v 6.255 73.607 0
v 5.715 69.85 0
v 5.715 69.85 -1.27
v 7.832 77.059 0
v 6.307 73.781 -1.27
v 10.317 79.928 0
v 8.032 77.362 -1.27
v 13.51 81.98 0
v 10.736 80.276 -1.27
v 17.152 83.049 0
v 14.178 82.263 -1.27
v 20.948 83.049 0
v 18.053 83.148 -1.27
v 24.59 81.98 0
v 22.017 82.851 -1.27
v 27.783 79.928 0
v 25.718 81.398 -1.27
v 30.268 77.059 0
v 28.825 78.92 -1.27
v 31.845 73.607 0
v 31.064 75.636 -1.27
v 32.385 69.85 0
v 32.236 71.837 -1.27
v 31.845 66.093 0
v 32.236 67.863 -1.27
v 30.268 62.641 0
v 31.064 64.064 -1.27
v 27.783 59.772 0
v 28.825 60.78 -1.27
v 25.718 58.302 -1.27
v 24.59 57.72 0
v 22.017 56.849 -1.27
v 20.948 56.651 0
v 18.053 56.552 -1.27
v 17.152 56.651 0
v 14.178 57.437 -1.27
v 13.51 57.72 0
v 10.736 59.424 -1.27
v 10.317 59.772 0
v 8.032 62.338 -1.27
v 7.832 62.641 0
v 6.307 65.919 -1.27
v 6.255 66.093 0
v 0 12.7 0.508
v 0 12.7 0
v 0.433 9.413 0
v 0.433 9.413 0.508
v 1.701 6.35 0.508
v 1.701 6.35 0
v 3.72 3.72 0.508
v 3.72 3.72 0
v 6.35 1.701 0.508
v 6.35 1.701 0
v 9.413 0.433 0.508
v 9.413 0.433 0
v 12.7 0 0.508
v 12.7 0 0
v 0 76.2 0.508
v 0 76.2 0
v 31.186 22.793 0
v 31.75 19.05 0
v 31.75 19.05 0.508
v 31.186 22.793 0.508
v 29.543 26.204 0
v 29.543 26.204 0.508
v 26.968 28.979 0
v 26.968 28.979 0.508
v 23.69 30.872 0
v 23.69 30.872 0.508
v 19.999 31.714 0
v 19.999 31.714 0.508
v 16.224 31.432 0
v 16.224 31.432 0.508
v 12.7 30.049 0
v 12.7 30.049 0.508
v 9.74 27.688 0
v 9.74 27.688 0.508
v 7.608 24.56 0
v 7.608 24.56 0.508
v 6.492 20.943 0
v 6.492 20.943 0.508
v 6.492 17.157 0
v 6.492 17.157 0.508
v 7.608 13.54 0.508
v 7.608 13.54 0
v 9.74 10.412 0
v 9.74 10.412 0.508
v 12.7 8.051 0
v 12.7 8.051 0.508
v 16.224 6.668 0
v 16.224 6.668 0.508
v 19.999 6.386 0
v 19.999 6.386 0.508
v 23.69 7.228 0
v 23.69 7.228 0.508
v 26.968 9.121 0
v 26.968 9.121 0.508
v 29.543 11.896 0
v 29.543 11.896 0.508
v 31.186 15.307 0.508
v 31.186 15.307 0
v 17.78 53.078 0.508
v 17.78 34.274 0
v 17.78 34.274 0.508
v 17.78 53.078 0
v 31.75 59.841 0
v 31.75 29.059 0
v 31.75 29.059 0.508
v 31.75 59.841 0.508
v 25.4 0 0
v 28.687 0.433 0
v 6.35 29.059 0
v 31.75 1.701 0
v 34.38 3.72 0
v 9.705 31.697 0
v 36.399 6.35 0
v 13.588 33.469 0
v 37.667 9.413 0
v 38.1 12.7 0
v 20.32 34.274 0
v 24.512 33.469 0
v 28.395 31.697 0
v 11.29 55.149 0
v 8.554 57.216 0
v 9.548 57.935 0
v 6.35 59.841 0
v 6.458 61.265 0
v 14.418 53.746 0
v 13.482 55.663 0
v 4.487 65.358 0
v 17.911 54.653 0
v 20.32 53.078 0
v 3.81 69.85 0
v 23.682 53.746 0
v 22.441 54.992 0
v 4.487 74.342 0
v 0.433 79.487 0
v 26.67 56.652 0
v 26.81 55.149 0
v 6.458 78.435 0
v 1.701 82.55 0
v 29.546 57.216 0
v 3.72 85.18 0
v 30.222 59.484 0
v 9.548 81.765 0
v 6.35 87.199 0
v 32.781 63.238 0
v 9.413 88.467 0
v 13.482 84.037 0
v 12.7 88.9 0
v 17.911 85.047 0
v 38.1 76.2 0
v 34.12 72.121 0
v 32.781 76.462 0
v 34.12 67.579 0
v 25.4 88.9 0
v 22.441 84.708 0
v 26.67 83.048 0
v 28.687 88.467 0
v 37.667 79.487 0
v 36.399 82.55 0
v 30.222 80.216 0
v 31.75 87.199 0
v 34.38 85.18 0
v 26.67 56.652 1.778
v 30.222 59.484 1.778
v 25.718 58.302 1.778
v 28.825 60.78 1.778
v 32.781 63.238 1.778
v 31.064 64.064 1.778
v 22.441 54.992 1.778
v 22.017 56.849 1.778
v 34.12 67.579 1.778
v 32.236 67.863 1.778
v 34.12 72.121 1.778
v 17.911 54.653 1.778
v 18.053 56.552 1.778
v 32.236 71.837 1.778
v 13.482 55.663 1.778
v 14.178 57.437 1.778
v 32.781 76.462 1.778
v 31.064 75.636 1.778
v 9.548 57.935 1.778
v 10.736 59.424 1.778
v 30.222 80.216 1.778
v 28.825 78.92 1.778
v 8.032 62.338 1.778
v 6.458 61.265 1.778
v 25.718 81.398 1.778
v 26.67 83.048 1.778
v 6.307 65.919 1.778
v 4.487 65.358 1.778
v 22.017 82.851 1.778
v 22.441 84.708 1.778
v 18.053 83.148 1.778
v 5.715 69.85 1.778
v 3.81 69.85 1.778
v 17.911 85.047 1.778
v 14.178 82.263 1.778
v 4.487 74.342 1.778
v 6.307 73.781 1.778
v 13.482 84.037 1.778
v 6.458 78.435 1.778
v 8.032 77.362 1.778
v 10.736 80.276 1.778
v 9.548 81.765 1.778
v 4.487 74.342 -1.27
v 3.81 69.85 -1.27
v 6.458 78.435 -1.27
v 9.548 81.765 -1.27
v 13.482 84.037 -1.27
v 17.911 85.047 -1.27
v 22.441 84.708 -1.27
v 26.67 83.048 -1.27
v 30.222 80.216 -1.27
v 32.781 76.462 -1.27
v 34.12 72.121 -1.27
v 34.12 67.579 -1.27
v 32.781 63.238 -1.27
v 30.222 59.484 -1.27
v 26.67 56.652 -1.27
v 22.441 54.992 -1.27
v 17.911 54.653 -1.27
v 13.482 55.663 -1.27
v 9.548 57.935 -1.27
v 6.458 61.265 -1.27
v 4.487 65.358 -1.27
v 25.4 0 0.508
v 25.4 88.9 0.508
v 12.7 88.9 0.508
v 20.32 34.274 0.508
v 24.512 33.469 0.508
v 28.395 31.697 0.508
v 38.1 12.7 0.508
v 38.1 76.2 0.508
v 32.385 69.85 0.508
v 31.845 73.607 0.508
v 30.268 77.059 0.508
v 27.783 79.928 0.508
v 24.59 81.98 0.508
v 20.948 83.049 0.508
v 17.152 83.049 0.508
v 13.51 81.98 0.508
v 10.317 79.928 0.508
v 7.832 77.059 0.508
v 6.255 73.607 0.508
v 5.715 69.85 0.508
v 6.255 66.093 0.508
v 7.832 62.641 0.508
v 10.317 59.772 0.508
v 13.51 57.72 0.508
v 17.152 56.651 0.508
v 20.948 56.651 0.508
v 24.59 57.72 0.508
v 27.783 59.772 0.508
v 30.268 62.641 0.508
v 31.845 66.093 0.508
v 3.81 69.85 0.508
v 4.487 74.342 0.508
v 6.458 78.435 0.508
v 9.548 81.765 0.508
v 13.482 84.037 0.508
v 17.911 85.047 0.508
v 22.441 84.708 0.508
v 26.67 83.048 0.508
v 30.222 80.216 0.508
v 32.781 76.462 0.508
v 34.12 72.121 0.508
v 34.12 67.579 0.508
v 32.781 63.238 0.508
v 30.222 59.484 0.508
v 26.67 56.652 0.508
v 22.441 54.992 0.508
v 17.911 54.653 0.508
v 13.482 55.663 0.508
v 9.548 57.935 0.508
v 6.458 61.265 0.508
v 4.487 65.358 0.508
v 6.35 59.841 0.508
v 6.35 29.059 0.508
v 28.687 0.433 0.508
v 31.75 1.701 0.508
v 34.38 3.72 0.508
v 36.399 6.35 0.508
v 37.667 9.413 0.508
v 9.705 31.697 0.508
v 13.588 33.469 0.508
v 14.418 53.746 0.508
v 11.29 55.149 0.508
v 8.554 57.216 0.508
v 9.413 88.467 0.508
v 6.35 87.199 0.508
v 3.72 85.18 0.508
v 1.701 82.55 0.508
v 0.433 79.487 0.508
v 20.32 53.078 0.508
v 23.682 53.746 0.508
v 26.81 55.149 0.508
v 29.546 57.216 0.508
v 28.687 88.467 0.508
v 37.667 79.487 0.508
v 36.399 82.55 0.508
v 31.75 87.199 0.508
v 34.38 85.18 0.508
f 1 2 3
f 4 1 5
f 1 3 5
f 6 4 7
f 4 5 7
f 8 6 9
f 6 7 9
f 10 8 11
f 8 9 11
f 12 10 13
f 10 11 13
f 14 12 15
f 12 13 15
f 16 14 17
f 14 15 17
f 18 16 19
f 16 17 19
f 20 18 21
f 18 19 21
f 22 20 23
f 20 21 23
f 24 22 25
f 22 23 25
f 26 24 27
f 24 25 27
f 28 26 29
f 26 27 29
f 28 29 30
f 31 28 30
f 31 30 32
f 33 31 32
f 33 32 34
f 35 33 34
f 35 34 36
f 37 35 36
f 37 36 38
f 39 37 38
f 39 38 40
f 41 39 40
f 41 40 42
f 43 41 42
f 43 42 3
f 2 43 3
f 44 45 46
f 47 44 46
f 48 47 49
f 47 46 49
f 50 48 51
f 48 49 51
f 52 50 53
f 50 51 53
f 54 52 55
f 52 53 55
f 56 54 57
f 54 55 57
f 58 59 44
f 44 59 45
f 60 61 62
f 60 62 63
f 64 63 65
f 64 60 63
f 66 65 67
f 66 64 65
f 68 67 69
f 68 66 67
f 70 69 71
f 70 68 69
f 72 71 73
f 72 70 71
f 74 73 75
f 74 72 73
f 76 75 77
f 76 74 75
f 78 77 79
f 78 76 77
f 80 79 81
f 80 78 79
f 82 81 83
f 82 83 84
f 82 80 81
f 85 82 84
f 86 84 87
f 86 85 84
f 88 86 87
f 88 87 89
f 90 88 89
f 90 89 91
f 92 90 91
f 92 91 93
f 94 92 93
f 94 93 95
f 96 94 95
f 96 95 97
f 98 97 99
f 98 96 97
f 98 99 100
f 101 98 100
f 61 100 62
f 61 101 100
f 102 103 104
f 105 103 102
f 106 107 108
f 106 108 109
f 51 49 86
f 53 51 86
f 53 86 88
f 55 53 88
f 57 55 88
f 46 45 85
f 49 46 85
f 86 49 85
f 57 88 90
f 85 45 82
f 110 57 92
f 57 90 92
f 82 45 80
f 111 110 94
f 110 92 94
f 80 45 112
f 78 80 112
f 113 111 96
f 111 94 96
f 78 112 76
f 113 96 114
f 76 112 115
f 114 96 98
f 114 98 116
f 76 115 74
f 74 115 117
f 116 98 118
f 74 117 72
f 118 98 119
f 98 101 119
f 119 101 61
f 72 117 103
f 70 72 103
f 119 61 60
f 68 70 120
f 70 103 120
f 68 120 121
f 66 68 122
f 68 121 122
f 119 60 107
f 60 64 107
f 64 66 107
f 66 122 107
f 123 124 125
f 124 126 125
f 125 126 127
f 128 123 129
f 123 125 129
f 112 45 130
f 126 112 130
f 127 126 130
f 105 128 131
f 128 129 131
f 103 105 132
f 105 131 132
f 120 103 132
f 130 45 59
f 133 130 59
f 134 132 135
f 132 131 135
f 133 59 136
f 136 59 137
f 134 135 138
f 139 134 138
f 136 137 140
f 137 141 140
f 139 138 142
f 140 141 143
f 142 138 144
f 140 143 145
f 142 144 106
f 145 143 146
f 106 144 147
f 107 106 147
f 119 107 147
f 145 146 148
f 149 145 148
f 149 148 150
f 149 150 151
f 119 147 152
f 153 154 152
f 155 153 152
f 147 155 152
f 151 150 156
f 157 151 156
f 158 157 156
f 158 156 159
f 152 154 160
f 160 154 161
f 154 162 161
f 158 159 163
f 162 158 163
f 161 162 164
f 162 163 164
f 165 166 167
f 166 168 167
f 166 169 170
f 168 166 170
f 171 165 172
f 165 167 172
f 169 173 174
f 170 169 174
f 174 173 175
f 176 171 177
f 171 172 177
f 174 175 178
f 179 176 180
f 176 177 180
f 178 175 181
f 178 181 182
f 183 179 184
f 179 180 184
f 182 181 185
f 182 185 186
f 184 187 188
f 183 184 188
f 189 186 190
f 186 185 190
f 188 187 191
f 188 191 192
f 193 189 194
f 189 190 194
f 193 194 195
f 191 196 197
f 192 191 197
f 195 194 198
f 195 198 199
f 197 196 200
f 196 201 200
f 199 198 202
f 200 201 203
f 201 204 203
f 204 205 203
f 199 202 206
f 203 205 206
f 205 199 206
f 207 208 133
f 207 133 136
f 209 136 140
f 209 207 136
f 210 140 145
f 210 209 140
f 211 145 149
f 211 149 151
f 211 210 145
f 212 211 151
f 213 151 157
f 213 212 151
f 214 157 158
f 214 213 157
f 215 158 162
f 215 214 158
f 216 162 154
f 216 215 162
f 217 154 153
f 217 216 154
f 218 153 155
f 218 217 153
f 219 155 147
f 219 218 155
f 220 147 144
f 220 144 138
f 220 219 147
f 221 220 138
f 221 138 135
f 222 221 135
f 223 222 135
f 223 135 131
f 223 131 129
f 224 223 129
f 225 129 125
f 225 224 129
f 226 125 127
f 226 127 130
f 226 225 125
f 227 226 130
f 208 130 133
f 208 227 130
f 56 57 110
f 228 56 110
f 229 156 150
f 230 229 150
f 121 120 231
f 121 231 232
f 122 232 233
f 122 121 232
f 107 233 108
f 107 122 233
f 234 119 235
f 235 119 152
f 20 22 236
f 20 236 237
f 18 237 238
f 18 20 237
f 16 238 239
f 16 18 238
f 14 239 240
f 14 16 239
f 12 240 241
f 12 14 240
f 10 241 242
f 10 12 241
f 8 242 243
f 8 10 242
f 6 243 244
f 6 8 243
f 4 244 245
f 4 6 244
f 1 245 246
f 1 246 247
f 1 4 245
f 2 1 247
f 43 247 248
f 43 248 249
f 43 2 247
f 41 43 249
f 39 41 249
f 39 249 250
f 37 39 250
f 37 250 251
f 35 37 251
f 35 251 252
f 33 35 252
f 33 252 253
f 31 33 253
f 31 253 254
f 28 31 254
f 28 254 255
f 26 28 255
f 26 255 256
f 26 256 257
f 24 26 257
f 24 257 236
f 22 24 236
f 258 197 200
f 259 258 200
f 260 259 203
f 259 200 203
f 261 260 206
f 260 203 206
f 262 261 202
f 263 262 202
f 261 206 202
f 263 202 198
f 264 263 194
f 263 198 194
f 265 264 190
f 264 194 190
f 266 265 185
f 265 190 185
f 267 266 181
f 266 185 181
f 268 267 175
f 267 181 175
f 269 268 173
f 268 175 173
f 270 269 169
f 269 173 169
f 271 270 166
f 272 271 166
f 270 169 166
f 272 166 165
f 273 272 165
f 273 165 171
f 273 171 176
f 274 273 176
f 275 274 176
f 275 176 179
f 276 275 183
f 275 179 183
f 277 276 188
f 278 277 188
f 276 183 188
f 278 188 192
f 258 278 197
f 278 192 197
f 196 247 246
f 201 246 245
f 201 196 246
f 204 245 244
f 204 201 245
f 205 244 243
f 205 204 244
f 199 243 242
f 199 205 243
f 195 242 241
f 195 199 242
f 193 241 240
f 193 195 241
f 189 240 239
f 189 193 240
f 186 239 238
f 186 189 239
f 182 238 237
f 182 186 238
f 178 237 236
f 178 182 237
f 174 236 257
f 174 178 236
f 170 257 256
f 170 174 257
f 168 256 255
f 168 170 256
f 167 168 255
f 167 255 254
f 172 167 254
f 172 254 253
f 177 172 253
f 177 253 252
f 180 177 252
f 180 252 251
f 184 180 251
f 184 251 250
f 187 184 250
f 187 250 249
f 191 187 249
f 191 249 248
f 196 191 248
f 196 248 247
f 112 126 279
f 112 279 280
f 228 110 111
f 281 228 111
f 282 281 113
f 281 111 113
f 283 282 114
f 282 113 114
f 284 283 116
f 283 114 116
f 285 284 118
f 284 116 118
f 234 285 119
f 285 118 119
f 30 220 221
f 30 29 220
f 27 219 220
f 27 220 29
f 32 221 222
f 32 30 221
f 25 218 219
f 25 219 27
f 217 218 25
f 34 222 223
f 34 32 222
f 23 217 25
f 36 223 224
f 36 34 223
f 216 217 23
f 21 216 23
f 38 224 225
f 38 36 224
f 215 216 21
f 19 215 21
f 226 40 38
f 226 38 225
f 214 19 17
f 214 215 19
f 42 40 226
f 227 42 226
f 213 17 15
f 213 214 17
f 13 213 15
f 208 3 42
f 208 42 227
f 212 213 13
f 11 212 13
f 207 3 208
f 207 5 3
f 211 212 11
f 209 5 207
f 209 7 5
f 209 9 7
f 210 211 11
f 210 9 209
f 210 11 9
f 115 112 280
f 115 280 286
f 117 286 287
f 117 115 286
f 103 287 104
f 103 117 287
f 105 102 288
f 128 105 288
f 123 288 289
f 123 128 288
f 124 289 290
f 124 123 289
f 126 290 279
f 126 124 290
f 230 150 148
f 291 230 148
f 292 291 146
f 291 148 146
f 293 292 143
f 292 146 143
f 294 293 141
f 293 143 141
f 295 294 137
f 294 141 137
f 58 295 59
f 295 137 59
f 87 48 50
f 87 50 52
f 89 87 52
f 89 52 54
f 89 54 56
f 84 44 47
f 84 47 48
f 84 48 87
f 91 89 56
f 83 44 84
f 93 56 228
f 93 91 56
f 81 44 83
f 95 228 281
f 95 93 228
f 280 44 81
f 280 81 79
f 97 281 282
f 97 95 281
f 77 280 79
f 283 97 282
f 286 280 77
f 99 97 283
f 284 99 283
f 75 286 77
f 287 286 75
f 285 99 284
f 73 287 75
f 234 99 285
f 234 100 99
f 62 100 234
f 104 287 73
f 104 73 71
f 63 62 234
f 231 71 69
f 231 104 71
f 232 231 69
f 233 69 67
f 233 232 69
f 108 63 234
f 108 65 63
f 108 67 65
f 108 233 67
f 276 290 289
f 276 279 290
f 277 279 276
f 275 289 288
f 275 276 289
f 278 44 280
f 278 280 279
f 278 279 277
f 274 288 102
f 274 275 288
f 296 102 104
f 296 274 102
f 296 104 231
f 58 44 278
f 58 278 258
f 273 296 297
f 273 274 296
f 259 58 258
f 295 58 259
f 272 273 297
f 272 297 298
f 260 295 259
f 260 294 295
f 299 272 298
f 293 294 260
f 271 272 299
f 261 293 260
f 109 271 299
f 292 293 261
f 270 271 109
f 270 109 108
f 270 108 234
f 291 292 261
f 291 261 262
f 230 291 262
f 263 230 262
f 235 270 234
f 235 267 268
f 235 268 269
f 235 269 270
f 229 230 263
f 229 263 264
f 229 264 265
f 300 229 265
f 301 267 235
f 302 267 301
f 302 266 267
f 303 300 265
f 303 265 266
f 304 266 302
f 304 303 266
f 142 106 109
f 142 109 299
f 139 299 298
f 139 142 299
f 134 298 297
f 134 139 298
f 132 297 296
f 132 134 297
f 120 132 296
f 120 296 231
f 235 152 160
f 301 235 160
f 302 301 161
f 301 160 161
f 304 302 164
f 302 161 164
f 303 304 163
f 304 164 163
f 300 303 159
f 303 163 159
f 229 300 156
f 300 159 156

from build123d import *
from build123d.topology import SkipClean

# Parameters (mm, degrees)
SKETCH2_R           = 13.335
SKETCH2_R_2         = 12.7
BOSS_EXTRUDE1_DEPTH = 0.508
BOSS_EXTRUDE2_START = 1.27
SKETCH3_R           = 15.24
SKETCH3_R_2         = 13.335
BOSS_EXTRUDE2_DEPTH = 1.27
CUT_EXTRUDE1_DEPTH  = 97.736659463
BOSS_EXTRUDE3_DEPTH = 0.508


with BuildPart() as part:
    # Sketch2 → Boss-Extrude1 (new body)
    with BuildSketch(Plane.XY):
        with BuildLine():
            Line((12.7, 0), (25.4, 0))
            ThreePointArc((25.4, 0), (34.380256121, 3.719743879), (38.1, 12.7))
            Line((38.1, 12.7), (38.1, 76.2))
            ThreePointArc((38.1, 76.2), (34.380256121, 85.180256121), (25.4, 88.9))
            Line((25.4, 88.9), (12.7, 88.9))
            ThreePointArc((12.7, 88.9), (3.719743879, 85.180256121), (0, 76.2))
            Line((0, 76.2), (0, 12.7))
            ThreePointArc((0, 12.7), (3.719743879, 3.719743879), (12.7, 0))
        make_face()
        with Locations((19.05, 69.85)):
            Circle(SKETCH2_R, mode=Mode.SUBTRACT)
        with Locations((19.05, 19.05)):
            Circle(SKETCH2_R_2, mode=Mode.SUBTRACT)
    extrude(amount=BOSS_EXTRUDE1_DEPTH)

    # Sketch3 → Boss-Extrude2 (add)
    with SkipClean():  # the faces are left unmerged after this step: merging them gives an invalid solid
        with BuildSketch(Plane(origin=(0, 0, 0), x_dir=(-1, 0, 0), z_dir=(0, 0, -1)).offset(BOSS_EXTRUDE2_START)):
            with Locations((-19.05, 69.85)):
                Circle(SKETCH3_R)
            with Locations((-19.05, 69.85)):
                Circle(SKETCH3_R_2, mode=Mode.SUBTRACT)
        boss_extrude2 = extrude(amount=-BOSS_EXTRUDE2_DEPTH)

    # Mirror1: Boss-Extrude2 across plane
    add(boss_extrude2.mirror(Plane(origin=(0, 0, 0.254), x_dir=(1, 0, 0), z_dir=(0, 0, -1))))

    # Sketch4 → Cut-Extrude1 (cut, through all)
    with BuildSketch(Plane(origin=(0, 0, 0), x_dir=(-1, 0, 0), z_dir=(0, 0, -1))):
        with BuildLine():
            Line((-31.75, 29.058935454), (-31.75, 59.841064546))
            ThreePointArc((-31.75, 59.841064546), (-19.05, 53.025291513), (-6.35, 59.841064546))
            Line((-6.35, 59.841064546), (-6.35, 29.058935454))
            ThreePointArc((-6.35, 29.058935454), (-19.05, 34.319447696), (-31.75, 29.058935454))
        make_face()
    extrude(amount=-CUT_EXTRUDE1_DEPTH, mode=Mode.SUBTRACT)

    # Sketch5 → Boss-Extrude3 (add)
    with BuildSketch(Plane(origin=(0, 0, 0), x_dir=(-1, 0, 0), z_dir=(0, 0, -1))):
        Polygon((-20.32, 53.025291513), (-20.32, 34.319447696), (-20.32, 34.162691866), (-17.78, 34.162691866), (-17.78, 34.23115412), (-17.78, 34.319447696), (-17.78, 53.025291513), (-17.78, 53.171866838), (-20.32, 53.171866838), align=None)
    extrude(amount=-BOSS_EXTRUDE3_DEPTH)


solid = part.part
